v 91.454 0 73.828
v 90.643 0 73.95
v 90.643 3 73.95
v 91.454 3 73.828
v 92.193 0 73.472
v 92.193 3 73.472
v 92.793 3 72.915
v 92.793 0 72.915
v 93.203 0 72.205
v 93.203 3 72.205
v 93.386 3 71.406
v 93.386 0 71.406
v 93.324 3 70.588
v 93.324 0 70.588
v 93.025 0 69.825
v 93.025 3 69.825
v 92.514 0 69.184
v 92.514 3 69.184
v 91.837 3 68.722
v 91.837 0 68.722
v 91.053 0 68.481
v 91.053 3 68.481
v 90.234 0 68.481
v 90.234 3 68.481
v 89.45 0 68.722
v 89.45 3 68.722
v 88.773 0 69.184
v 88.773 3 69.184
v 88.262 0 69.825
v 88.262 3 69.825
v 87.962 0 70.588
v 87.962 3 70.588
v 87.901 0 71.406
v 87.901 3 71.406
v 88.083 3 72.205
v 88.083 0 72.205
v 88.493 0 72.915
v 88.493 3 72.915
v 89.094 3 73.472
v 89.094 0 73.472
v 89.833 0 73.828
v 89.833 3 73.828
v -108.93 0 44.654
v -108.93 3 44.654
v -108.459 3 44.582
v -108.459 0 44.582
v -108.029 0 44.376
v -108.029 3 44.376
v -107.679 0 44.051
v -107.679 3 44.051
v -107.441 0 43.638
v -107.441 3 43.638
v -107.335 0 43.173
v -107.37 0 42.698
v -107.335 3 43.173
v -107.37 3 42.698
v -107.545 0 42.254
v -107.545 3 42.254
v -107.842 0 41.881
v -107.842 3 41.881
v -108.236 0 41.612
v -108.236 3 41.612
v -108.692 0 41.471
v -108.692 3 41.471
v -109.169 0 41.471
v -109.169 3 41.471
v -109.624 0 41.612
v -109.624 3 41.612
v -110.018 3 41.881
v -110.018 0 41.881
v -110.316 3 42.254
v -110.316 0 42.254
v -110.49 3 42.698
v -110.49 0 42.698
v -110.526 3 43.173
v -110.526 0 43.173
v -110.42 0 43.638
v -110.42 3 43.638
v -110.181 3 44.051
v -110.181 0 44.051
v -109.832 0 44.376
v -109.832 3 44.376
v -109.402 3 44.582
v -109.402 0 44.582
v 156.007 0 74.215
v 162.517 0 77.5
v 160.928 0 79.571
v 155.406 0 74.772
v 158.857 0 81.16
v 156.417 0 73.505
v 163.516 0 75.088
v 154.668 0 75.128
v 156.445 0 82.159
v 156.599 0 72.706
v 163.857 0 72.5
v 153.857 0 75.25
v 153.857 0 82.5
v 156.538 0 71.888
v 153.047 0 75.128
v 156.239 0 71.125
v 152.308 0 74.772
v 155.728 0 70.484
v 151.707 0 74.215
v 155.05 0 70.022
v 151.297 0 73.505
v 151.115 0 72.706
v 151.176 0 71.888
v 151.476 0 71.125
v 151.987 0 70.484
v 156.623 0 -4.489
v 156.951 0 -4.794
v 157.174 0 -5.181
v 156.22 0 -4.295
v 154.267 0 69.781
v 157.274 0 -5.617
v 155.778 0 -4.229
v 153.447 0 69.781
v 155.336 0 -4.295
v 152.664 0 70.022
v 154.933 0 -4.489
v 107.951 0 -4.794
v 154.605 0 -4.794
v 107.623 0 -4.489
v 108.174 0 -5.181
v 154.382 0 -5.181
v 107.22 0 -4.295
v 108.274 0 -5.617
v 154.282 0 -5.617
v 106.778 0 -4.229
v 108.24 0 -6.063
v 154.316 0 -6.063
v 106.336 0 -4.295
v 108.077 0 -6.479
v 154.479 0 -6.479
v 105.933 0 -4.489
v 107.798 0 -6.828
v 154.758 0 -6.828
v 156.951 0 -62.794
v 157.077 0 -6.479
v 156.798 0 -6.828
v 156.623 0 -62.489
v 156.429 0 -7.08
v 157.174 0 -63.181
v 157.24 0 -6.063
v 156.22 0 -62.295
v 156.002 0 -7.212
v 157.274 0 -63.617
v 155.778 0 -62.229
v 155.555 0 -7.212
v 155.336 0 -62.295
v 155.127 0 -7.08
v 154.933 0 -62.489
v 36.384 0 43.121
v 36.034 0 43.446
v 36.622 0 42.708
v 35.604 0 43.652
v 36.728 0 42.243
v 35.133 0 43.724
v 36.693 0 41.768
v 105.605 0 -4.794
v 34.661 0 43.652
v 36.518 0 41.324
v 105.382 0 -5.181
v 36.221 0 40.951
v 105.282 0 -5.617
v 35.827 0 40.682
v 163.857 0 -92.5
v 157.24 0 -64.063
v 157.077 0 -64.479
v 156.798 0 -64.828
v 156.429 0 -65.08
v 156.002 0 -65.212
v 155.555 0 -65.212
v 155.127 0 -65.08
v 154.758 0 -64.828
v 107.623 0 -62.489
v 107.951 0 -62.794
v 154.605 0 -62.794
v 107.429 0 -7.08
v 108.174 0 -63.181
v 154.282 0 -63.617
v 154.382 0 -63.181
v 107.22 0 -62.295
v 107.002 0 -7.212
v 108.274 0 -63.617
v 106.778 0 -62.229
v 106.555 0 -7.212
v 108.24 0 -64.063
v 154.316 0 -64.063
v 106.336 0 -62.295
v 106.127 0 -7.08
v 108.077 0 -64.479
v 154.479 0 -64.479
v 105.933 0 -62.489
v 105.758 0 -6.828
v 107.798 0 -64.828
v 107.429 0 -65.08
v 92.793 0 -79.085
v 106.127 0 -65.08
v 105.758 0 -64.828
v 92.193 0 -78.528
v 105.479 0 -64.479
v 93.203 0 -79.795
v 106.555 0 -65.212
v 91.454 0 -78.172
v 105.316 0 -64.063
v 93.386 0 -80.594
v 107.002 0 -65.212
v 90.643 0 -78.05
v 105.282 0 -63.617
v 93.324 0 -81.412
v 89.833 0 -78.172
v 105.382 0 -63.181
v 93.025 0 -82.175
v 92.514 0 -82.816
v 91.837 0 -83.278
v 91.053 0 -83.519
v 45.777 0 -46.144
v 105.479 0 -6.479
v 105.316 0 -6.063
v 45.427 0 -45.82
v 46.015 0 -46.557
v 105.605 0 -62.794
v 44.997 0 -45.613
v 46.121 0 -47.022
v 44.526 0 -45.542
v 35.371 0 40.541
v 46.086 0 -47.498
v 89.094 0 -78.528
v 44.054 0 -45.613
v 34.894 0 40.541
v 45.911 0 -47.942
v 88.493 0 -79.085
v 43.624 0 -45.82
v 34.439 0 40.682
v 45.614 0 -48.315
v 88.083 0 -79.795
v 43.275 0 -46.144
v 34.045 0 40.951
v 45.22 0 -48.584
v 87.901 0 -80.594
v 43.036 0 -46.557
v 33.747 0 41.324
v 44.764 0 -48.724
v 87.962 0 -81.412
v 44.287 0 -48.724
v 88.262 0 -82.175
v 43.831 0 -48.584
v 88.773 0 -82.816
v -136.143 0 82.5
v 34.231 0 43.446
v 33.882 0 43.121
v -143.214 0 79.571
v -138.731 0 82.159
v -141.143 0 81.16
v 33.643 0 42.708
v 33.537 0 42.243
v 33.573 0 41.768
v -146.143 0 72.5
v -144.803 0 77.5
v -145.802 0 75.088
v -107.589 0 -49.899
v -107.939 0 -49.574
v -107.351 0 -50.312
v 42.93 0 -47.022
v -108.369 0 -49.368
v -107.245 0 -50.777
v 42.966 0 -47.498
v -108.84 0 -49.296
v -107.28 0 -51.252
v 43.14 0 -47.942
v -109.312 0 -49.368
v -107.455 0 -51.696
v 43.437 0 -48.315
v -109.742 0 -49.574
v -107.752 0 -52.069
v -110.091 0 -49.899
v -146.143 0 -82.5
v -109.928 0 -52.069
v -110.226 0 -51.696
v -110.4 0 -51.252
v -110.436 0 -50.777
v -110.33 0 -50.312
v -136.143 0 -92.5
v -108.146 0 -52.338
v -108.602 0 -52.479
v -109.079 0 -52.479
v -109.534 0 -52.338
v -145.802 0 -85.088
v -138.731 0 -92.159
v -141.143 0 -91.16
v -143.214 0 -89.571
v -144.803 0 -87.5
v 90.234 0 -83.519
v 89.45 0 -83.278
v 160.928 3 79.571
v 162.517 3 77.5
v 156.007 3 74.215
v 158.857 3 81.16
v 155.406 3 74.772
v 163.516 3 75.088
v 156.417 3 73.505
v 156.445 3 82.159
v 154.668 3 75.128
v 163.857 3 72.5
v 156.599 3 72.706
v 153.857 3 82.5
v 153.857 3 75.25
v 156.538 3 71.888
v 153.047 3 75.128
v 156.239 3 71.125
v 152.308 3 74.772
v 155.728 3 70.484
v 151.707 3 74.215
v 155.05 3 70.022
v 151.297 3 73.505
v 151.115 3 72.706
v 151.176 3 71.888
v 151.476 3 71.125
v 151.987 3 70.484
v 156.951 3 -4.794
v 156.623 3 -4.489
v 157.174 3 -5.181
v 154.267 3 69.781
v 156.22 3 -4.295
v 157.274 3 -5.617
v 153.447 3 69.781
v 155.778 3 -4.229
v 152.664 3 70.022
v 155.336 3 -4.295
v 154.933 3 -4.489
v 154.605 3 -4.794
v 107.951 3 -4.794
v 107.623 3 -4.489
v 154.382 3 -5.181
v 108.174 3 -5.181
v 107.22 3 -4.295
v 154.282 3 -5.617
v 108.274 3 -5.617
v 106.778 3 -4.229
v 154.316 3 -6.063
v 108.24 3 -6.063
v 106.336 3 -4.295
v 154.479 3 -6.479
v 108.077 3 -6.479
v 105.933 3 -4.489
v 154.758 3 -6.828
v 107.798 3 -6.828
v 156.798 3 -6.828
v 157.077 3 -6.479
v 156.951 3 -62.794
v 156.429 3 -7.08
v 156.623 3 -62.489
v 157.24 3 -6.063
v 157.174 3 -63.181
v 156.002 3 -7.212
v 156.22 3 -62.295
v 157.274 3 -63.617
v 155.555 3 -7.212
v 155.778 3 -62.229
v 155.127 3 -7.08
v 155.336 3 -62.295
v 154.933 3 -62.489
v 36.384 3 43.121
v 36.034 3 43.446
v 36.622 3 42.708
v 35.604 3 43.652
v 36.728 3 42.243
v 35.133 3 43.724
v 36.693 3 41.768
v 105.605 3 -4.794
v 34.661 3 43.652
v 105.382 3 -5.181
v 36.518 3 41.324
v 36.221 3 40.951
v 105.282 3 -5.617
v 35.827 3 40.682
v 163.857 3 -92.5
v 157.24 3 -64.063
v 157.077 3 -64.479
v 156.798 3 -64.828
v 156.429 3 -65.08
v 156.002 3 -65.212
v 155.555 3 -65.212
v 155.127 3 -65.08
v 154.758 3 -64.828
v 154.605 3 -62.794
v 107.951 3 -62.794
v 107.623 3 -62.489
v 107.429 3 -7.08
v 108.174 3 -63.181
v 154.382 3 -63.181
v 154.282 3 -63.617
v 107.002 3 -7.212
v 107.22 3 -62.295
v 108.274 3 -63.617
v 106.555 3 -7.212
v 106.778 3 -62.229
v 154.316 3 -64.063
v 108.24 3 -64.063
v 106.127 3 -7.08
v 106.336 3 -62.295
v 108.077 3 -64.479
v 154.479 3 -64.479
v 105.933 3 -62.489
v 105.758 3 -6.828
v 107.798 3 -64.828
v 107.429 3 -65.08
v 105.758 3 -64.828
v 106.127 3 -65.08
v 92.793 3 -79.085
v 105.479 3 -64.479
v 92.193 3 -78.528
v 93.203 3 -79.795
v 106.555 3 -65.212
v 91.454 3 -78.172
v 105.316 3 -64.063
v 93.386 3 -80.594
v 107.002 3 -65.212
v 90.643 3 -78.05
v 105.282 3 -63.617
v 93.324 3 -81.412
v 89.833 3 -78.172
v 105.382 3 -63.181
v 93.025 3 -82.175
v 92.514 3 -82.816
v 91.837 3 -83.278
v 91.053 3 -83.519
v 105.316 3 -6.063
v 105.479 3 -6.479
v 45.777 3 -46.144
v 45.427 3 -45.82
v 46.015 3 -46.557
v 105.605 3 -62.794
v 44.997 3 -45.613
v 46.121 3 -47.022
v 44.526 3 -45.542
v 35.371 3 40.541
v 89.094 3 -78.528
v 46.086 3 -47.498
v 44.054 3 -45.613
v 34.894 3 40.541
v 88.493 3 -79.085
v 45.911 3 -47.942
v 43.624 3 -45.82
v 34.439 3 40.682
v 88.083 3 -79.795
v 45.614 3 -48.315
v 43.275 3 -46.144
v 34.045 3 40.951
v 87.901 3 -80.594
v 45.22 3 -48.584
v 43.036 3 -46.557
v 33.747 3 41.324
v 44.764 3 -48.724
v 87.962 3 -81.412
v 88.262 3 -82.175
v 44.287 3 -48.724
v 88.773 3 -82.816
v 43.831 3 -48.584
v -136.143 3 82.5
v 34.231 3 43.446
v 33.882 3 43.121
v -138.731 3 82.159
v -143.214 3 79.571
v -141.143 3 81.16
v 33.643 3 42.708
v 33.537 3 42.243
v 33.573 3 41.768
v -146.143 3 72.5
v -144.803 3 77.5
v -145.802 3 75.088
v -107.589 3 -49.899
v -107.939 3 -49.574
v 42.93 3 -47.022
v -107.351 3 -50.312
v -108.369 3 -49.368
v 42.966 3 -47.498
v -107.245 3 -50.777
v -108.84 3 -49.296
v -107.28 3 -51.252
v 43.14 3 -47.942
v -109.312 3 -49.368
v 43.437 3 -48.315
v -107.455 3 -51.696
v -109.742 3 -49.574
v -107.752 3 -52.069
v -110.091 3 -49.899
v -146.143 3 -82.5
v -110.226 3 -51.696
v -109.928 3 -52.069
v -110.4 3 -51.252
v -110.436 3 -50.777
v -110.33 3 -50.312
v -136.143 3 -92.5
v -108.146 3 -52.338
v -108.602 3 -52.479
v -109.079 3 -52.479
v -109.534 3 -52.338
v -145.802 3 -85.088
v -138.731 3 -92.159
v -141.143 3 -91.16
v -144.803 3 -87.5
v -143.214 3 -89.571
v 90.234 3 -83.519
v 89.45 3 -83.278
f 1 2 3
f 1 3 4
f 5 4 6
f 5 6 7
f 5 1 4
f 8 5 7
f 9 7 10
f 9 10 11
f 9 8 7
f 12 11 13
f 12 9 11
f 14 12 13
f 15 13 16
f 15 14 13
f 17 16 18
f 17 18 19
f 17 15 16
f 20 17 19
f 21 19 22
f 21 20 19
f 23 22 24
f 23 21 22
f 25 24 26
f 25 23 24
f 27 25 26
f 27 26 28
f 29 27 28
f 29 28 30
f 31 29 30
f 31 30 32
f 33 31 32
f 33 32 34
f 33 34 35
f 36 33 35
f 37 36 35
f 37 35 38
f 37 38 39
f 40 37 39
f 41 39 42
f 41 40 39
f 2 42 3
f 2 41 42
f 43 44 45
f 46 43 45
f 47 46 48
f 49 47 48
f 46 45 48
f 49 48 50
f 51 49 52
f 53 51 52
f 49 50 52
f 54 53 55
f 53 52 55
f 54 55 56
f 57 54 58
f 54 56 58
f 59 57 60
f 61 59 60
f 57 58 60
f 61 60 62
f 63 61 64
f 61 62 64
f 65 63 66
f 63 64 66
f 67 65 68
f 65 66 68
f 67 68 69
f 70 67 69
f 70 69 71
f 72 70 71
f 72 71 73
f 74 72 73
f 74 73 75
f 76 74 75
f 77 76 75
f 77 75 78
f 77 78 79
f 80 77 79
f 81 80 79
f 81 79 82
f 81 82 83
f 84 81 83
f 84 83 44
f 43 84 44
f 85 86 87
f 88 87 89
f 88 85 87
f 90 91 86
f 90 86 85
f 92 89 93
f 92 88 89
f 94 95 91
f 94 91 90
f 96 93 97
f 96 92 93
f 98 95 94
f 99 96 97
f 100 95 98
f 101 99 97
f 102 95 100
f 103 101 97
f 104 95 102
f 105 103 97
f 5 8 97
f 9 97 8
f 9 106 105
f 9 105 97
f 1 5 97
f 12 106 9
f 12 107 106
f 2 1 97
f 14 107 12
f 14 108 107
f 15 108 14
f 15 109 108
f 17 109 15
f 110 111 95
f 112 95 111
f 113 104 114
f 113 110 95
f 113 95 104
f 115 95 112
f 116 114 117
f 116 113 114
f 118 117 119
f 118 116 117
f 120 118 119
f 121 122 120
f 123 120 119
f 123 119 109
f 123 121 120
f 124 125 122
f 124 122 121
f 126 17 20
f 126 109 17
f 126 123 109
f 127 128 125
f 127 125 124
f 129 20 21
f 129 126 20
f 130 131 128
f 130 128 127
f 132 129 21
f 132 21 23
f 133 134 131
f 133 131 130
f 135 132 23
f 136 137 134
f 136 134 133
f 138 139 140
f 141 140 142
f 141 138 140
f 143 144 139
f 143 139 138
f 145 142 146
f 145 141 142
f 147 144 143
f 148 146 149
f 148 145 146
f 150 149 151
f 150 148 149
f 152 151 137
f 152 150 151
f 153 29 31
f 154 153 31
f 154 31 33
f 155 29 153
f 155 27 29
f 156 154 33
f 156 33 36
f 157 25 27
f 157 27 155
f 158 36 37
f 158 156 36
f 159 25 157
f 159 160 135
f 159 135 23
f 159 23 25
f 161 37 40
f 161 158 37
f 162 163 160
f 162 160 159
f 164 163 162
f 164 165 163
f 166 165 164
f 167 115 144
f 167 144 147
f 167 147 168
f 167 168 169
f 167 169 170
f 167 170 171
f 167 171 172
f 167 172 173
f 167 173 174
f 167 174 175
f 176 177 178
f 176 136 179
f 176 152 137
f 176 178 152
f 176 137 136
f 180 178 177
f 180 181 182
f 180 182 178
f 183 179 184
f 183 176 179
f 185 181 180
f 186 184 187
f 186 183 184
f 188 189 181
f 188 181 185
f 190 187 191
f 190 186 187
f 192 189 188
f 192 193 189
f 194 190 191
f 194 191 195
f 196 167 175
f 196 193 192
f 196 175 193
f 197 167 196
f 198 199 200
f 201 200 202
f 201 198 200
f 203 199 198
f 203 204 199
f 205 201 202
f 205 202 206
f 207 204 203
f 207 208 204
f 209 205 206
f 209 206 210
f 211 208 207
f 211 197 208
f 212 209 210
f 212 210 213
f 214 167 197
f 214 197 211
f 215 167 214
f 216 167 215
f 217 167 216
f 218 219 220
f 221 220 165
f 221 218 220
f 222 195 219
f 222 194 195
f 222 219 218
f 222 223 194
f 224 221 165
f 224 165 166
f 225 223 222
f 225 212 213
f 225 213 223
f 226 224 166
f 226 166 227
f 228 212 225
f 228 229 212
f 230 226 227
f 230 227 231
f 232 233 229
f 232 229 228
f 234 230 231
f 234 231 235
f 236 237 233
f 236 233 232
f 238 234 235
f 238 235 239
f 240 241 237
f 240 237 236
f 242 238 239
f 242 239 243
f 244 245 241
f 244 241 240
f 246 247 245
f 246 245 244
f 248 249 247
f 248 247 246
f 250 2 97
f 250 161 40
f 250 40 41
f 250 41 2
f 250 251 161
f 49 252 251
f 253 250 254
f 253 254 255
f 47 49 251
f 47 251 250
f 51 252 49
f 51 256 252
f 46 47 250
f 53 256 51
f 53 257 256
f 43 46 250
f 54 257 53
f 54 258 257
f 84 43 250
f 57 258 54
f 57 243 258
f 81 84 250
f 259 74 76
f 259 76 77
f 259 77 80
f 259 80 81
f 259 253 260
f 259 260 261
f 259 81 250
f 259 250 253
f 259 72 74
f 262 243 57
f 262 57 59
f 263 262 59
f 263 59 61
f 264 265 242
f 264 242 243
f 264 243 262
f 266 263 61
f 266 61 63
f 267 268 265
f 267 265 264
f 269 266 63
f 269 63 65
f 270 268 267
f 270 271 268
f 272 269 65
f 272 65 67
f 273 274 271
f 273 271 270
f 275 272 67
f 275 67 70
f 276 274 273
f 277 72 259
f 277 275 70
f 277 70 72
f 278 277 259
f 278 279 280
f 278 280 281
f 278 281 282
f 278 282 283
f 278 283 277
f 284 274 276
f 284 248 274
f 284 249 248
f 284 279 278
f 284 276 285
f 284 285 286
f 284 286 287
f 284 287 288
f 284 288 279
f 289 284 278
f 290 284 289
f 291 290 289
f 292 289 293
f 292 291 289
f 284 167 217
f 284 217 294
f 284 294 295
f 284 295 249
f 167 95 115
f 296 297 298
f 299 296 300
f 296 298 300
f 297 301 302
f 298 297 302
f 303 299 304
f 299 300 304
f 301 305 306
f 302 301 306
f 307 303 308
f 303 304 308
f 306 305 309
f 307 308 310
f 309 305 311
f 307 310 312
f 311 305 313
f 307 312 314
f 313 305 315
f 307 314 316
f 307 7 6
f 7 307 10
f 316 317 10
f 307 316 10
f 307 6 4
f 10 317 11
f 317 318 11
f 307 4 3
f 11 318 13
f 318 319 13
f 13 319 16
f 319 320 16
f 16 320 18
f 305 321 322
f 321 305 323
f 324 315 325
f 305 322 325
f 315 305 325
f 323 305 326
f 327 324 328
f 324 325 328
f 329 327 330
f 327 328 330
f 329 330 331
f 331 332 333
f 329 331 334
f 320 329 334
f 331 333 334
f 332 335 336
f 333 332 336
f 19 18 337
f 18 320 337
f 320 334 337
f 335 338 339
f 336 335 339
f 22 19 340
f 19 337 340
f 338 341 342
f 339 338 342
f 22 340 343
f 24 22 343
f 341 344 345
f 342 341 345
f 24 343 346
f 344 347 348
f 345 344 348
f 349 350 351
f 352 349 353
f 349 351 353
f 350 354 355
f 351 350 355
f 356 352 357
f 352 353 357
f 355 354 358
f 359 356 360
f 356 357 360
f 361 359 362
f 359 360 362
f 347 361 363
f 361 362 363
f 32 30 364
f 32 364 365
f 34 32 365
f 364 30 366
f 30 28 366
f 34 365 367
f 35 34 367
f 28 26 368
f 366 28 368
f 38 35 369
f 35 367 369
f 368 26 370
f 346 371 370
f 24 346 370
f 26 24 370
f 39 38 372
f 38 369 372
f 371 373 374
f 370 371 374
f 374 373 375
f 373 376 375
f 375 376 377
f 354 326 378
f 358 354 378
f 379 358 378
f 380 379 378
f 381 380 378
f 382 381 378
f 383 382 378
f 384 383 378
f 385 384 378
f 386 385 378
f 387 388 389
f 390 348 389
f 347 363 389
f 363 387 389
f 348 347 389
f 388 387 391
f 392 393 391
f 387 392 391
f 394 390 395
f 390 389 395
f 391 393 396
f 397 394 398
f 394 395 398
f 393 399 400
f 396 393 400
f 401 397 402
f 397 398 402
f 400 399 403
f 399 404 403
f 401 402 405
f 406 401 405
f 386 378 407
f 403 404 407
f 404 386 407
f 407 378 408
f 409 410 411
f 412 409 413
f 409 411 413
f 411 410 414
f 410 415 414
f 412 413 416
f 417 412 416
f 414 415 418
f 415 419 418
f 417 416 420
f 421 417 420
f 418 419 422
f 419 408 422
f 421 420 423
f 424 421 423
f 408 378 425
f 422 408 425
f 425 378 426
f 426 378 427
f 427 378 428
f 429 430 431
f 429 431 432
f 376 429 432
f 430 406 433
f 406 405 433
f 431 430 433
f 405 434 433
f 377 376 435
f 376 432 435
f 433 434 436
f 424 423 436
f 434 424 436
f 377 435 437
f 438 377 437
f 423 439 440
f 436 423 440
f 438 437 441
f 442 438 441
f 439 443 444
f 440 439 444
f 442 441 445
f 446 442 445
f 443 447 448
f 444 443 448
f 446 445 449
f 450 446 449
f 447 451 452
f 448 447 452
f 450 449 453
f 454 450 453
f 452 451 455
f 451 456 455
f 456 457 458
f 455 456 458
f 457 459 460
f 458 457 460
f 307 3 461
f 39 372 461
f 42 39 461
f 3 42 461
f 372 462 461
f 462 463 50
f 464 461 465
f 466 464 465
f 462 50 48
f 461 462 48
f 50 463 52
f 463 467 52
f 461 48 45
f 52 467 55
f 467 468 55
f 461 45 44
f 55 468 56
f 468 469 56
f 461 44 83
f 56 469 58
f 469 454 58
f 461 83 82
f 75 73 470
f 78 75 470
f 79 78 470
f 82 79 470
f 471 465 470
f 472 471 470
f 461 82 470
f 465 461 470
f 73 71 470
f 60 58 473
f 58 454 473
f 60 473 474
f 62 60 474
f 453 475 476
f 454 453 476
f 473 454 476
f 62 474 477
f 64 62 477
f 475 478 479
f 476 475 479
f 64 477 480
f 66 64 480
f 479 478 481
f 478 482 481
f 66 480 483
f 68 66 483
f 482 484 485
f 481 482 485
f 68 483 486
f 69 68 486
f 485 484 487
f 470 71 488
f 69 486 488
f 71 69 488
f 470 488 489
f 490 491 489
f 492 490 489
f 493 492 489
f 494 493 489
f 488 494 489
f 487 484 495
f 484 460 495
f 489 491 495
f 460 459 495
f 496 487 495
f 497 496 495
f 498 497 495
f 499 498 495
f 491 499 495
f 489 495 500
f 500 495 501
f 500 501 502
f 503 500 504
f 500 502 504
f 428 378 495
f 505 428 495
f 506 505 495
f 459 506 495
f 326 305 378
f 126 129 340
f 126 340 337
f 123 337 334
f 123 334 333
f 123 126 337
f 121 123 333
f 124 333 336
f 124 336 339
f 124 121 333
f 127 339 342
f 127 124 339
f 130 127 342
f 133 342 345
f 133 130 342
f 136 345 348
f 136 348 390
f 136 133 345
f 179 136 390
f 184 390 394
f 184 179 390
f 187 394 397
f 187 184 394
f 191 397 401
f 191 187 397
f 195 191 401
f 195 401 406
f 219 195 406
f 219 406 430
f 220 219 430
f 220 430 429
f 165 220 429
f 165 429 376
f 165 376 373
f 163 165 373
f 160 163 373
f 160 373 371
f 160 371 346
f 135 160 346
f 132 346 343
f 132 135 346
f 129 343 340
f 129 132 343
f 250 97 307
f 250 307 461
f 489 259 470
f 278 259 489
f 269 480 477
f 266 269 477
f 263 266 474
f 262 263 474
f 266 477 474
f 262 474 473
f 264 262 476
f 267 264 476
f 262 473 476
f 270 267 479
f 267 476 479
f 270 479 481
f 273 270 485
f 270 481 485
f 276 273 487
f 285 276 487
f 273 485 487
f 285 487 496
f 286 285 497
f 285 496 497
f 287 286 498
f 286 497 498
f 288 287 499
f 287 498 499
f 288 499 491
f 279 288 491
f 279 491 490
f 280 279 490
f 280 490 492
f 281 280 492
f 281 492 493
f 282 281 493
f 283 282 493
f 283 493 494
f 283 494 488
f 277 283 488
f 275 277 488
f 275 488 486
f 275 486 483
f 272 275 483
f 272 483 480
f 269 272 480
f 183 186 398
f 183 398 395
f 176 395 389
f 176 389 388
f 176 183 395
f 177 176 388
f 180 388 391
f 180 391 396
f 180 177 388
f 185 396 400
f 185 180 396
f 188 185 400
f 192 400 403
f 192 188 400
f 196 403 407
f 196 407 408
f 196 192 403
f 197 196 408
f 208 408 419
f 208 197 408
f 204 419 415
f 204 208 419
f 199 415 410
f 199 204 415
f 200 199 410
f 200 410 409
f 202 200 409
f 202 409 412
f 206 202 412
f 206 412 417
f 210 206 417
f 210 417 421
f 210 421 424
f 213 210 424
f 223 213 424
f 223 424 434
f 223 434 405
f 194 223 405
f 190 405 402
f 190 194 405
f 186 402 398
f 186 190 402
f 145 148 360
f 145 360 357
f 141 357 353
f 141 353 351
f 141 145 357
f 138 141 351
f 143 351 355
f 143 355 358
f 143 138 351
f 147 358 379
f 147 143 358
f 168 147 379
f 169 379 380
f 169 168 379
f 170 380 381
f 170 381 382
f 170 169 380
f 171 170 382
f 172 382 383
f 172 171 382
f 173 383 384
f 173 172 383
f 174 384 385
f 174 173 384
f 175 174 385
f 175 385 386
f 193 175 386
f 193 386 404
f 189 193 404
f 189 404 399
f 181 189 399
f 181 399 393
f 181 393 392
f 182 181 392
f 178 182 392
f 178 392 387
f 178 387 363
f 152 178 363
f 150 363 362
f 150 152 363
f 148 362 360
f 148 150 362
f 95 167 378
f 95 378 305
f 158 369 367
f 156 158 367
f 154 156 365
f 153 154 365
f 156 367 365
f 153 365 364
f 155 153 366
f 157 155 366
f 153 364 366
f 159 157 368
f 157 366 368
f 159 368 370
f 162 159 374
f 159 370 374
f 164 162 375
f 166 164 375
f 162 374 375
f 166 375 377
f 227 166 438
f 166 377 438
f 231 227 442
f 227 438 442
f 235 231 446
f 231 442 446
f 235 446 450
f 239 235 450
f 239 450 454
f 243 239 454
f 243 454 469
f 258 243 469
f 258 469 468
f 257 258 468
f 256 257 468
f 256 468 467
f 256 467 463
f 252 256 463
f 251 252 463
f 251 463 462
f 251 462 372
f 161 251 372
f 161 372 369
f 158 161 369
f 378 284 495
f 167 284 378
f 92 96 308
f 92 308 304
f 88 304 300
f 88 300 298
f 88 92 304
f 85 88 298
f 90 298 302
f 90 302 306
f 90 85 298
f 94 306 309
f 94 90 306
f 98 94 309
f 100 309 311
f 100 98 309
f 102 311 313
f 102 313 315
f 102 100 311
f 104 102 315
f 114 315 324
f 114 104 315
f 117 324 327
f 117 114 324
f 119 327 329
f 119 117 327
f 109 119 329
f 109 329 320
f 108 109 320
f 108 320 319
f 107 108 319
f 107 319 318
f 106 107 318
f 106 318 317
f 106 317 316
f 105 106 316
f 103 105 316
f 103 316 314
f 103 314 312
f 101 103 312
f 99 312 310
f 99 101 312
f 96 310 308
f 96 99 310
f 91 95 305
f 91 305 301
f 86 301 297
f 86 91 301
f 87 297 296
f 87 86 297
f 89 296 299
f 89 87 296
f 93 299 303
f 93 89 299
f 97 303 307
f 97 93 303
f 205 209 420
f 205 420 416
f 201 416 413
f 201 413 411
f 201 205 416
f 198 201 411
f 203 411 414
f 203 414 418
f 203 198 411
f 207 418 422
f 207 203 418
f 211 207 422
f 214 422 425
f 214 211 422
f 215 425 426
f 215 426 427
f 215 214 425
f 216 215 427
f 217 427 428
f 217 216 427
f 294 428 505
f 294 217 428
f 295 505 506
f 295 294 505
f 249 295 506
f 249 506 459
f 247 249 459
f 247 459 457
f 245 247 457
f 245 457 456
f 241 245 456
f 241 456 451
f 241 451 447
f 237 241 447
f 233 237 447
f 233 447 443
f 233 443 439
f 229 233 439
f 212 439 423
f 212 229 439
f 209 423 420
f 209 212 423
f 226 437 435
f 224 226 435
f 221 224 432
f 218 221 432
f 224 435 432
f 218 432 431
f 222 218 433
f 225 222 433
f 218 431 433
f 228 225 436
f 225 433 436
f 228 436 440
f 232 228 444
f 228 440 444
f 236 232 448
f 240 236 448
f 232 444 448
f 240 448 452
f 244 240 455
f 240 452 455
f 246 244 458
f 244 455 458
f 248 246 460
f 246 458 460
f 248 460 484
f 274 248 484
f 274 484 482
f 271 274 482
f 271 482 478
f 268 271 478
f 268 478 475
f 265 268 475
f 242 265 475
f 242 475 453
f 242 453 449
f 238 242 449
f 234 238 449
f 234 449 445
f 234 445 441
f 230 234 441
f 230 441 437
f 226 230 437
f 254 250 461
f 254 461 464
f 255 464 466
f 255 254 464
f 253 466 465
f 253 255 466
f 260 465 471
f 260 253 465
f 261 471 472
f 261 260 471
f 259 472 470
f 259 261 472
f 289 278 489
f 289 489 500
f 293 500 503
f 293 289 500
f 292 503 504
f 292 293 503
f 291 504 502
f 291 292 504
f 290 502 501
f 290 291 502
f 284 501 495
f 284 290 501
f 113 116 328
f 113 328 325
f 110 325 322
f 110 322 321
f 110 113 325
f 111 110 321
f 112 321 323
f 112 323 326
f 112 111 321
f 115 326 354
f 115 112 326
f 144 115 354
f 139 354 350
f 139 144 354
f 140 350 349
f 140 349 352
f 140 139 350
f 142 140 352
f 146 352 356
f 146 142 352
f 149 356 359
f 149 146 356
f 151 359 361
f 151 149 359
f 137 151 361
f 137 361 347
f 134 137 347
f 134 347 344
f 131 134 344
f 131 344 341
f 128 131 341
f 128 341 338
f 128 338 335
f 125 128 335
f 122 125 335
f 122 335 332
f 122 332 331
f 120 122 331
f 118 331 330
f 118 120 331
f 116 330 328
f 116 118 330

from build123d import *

# Parameters (mm, degrees)
ESQUISSE1_R        = 1.5
ESQUISSE1_R_2      = 2.75
BOSS_EXTRU_1_DEPTH = 3
SKETCH1_R          = 1.6
CUT_EXTRUDE9_DEPTH = 10


with BuildPart() as part:
    # Esquisse1 → Boss.-Extru.1 (new body)
    with BuildSketch(Plane(origin=(0, 0, 0), x_dir=(1, 0, 0), z_dir=(0, 1, 0))):
        with BuildLine():
            Line((-136.142857143, 92.5), (163.857142857, 92.5))
            Line((163.857142857, 92.5), (163.857142857, -72.5))
            ThreePointArc((163.857142857, -72.5), (160.928210669, -79.571067812), (153.857142857, -82.5))
            Line((153.857142857, -82.5), (-136.142857143, -82.5))
            ThreePointArc((-136.142857143, -82.5), (-143.213924955, -79.571067812), (-146.142857143, -72.5))
            Line((-146.142857143, -72.5), (-146.142857143, 82.5))
            ThreePointArc((-146.142857143, 82.5), (-143.213924955, 89.571067812), (-136.142857143, 92.5))
        make_face()
        with Locations(Location((106.778088173, 63.728751177, 0), (0, 0, 270))):
            Circle(ESQUISSE1_R, mode=Mode.SUBTRACT)
        with Locations(Location((155.778088173, 63.728751177, 0), (0, 0, 270))):
            Circle(ESQUISSE1_R, mode=Mode.SUBTRACT)
        with Locations(Location((106.778088173, 5.728751177, 0), (0, 0, 270))):
            Circle(ESQUISSE1_R, mode=Mode.SUBTRACT)
        with Locations(Location((90.64338627, 80.8, 0), (0, 0, 270))):
            Circle(ESQUISSE1_R_2, mode=Mode.SUBTRACT)
        with Locations(Location((155.778088173, 5.728751177, 0), (0, 0, 270))):
            Circle(ESQUISSE1_R, mode=Mode.SUBTRACT)
        with Locations(Location((153.857142857, -72.5, 0), (0, 0, 270))):
            Circle(ESQUISSE1_R_2, mode=Mode.SUBTRACT)
        with Locations(Location((90.643386268, -71.199999991, 0), (0, 0, 270))):
            Circle(ESQUISSE1_R_2, mode=Mode.SUBTRACT)
    extrude(amount=BOSS_EXTRU_1_DEPTH)

    # Sketch1 → Cut-Extrude9 (cut)
    with BuildSketch(Plane(origin=(0, 3, 0), x_dir=(1, 0, 0), z_dir=(0, 1, 0))):
        with Locations(Location((44.5256506, 47.141960397, 0), (0, 0, 270))):
            Circle(SKETCH1_R)
        with Locations(Location((35.132799329, -42.123541034, 0), (0, 0, 270))):
            Circle(SKETCH1_R)
        with Locations(Location((-108.930202511, -43.053575675, 0), (0, 0, 270))):
            Circle(SKETCH1_R)
        with Locations(Location((-108.84020251, 50.896424322, 0), (0, 0, 270))):
            Circle(SKETCH1_R)
    extrude(amount=-CUT_EXTRUDE9_DEPTH, mode=Mode.SUBTRACT)


solid = part.part
